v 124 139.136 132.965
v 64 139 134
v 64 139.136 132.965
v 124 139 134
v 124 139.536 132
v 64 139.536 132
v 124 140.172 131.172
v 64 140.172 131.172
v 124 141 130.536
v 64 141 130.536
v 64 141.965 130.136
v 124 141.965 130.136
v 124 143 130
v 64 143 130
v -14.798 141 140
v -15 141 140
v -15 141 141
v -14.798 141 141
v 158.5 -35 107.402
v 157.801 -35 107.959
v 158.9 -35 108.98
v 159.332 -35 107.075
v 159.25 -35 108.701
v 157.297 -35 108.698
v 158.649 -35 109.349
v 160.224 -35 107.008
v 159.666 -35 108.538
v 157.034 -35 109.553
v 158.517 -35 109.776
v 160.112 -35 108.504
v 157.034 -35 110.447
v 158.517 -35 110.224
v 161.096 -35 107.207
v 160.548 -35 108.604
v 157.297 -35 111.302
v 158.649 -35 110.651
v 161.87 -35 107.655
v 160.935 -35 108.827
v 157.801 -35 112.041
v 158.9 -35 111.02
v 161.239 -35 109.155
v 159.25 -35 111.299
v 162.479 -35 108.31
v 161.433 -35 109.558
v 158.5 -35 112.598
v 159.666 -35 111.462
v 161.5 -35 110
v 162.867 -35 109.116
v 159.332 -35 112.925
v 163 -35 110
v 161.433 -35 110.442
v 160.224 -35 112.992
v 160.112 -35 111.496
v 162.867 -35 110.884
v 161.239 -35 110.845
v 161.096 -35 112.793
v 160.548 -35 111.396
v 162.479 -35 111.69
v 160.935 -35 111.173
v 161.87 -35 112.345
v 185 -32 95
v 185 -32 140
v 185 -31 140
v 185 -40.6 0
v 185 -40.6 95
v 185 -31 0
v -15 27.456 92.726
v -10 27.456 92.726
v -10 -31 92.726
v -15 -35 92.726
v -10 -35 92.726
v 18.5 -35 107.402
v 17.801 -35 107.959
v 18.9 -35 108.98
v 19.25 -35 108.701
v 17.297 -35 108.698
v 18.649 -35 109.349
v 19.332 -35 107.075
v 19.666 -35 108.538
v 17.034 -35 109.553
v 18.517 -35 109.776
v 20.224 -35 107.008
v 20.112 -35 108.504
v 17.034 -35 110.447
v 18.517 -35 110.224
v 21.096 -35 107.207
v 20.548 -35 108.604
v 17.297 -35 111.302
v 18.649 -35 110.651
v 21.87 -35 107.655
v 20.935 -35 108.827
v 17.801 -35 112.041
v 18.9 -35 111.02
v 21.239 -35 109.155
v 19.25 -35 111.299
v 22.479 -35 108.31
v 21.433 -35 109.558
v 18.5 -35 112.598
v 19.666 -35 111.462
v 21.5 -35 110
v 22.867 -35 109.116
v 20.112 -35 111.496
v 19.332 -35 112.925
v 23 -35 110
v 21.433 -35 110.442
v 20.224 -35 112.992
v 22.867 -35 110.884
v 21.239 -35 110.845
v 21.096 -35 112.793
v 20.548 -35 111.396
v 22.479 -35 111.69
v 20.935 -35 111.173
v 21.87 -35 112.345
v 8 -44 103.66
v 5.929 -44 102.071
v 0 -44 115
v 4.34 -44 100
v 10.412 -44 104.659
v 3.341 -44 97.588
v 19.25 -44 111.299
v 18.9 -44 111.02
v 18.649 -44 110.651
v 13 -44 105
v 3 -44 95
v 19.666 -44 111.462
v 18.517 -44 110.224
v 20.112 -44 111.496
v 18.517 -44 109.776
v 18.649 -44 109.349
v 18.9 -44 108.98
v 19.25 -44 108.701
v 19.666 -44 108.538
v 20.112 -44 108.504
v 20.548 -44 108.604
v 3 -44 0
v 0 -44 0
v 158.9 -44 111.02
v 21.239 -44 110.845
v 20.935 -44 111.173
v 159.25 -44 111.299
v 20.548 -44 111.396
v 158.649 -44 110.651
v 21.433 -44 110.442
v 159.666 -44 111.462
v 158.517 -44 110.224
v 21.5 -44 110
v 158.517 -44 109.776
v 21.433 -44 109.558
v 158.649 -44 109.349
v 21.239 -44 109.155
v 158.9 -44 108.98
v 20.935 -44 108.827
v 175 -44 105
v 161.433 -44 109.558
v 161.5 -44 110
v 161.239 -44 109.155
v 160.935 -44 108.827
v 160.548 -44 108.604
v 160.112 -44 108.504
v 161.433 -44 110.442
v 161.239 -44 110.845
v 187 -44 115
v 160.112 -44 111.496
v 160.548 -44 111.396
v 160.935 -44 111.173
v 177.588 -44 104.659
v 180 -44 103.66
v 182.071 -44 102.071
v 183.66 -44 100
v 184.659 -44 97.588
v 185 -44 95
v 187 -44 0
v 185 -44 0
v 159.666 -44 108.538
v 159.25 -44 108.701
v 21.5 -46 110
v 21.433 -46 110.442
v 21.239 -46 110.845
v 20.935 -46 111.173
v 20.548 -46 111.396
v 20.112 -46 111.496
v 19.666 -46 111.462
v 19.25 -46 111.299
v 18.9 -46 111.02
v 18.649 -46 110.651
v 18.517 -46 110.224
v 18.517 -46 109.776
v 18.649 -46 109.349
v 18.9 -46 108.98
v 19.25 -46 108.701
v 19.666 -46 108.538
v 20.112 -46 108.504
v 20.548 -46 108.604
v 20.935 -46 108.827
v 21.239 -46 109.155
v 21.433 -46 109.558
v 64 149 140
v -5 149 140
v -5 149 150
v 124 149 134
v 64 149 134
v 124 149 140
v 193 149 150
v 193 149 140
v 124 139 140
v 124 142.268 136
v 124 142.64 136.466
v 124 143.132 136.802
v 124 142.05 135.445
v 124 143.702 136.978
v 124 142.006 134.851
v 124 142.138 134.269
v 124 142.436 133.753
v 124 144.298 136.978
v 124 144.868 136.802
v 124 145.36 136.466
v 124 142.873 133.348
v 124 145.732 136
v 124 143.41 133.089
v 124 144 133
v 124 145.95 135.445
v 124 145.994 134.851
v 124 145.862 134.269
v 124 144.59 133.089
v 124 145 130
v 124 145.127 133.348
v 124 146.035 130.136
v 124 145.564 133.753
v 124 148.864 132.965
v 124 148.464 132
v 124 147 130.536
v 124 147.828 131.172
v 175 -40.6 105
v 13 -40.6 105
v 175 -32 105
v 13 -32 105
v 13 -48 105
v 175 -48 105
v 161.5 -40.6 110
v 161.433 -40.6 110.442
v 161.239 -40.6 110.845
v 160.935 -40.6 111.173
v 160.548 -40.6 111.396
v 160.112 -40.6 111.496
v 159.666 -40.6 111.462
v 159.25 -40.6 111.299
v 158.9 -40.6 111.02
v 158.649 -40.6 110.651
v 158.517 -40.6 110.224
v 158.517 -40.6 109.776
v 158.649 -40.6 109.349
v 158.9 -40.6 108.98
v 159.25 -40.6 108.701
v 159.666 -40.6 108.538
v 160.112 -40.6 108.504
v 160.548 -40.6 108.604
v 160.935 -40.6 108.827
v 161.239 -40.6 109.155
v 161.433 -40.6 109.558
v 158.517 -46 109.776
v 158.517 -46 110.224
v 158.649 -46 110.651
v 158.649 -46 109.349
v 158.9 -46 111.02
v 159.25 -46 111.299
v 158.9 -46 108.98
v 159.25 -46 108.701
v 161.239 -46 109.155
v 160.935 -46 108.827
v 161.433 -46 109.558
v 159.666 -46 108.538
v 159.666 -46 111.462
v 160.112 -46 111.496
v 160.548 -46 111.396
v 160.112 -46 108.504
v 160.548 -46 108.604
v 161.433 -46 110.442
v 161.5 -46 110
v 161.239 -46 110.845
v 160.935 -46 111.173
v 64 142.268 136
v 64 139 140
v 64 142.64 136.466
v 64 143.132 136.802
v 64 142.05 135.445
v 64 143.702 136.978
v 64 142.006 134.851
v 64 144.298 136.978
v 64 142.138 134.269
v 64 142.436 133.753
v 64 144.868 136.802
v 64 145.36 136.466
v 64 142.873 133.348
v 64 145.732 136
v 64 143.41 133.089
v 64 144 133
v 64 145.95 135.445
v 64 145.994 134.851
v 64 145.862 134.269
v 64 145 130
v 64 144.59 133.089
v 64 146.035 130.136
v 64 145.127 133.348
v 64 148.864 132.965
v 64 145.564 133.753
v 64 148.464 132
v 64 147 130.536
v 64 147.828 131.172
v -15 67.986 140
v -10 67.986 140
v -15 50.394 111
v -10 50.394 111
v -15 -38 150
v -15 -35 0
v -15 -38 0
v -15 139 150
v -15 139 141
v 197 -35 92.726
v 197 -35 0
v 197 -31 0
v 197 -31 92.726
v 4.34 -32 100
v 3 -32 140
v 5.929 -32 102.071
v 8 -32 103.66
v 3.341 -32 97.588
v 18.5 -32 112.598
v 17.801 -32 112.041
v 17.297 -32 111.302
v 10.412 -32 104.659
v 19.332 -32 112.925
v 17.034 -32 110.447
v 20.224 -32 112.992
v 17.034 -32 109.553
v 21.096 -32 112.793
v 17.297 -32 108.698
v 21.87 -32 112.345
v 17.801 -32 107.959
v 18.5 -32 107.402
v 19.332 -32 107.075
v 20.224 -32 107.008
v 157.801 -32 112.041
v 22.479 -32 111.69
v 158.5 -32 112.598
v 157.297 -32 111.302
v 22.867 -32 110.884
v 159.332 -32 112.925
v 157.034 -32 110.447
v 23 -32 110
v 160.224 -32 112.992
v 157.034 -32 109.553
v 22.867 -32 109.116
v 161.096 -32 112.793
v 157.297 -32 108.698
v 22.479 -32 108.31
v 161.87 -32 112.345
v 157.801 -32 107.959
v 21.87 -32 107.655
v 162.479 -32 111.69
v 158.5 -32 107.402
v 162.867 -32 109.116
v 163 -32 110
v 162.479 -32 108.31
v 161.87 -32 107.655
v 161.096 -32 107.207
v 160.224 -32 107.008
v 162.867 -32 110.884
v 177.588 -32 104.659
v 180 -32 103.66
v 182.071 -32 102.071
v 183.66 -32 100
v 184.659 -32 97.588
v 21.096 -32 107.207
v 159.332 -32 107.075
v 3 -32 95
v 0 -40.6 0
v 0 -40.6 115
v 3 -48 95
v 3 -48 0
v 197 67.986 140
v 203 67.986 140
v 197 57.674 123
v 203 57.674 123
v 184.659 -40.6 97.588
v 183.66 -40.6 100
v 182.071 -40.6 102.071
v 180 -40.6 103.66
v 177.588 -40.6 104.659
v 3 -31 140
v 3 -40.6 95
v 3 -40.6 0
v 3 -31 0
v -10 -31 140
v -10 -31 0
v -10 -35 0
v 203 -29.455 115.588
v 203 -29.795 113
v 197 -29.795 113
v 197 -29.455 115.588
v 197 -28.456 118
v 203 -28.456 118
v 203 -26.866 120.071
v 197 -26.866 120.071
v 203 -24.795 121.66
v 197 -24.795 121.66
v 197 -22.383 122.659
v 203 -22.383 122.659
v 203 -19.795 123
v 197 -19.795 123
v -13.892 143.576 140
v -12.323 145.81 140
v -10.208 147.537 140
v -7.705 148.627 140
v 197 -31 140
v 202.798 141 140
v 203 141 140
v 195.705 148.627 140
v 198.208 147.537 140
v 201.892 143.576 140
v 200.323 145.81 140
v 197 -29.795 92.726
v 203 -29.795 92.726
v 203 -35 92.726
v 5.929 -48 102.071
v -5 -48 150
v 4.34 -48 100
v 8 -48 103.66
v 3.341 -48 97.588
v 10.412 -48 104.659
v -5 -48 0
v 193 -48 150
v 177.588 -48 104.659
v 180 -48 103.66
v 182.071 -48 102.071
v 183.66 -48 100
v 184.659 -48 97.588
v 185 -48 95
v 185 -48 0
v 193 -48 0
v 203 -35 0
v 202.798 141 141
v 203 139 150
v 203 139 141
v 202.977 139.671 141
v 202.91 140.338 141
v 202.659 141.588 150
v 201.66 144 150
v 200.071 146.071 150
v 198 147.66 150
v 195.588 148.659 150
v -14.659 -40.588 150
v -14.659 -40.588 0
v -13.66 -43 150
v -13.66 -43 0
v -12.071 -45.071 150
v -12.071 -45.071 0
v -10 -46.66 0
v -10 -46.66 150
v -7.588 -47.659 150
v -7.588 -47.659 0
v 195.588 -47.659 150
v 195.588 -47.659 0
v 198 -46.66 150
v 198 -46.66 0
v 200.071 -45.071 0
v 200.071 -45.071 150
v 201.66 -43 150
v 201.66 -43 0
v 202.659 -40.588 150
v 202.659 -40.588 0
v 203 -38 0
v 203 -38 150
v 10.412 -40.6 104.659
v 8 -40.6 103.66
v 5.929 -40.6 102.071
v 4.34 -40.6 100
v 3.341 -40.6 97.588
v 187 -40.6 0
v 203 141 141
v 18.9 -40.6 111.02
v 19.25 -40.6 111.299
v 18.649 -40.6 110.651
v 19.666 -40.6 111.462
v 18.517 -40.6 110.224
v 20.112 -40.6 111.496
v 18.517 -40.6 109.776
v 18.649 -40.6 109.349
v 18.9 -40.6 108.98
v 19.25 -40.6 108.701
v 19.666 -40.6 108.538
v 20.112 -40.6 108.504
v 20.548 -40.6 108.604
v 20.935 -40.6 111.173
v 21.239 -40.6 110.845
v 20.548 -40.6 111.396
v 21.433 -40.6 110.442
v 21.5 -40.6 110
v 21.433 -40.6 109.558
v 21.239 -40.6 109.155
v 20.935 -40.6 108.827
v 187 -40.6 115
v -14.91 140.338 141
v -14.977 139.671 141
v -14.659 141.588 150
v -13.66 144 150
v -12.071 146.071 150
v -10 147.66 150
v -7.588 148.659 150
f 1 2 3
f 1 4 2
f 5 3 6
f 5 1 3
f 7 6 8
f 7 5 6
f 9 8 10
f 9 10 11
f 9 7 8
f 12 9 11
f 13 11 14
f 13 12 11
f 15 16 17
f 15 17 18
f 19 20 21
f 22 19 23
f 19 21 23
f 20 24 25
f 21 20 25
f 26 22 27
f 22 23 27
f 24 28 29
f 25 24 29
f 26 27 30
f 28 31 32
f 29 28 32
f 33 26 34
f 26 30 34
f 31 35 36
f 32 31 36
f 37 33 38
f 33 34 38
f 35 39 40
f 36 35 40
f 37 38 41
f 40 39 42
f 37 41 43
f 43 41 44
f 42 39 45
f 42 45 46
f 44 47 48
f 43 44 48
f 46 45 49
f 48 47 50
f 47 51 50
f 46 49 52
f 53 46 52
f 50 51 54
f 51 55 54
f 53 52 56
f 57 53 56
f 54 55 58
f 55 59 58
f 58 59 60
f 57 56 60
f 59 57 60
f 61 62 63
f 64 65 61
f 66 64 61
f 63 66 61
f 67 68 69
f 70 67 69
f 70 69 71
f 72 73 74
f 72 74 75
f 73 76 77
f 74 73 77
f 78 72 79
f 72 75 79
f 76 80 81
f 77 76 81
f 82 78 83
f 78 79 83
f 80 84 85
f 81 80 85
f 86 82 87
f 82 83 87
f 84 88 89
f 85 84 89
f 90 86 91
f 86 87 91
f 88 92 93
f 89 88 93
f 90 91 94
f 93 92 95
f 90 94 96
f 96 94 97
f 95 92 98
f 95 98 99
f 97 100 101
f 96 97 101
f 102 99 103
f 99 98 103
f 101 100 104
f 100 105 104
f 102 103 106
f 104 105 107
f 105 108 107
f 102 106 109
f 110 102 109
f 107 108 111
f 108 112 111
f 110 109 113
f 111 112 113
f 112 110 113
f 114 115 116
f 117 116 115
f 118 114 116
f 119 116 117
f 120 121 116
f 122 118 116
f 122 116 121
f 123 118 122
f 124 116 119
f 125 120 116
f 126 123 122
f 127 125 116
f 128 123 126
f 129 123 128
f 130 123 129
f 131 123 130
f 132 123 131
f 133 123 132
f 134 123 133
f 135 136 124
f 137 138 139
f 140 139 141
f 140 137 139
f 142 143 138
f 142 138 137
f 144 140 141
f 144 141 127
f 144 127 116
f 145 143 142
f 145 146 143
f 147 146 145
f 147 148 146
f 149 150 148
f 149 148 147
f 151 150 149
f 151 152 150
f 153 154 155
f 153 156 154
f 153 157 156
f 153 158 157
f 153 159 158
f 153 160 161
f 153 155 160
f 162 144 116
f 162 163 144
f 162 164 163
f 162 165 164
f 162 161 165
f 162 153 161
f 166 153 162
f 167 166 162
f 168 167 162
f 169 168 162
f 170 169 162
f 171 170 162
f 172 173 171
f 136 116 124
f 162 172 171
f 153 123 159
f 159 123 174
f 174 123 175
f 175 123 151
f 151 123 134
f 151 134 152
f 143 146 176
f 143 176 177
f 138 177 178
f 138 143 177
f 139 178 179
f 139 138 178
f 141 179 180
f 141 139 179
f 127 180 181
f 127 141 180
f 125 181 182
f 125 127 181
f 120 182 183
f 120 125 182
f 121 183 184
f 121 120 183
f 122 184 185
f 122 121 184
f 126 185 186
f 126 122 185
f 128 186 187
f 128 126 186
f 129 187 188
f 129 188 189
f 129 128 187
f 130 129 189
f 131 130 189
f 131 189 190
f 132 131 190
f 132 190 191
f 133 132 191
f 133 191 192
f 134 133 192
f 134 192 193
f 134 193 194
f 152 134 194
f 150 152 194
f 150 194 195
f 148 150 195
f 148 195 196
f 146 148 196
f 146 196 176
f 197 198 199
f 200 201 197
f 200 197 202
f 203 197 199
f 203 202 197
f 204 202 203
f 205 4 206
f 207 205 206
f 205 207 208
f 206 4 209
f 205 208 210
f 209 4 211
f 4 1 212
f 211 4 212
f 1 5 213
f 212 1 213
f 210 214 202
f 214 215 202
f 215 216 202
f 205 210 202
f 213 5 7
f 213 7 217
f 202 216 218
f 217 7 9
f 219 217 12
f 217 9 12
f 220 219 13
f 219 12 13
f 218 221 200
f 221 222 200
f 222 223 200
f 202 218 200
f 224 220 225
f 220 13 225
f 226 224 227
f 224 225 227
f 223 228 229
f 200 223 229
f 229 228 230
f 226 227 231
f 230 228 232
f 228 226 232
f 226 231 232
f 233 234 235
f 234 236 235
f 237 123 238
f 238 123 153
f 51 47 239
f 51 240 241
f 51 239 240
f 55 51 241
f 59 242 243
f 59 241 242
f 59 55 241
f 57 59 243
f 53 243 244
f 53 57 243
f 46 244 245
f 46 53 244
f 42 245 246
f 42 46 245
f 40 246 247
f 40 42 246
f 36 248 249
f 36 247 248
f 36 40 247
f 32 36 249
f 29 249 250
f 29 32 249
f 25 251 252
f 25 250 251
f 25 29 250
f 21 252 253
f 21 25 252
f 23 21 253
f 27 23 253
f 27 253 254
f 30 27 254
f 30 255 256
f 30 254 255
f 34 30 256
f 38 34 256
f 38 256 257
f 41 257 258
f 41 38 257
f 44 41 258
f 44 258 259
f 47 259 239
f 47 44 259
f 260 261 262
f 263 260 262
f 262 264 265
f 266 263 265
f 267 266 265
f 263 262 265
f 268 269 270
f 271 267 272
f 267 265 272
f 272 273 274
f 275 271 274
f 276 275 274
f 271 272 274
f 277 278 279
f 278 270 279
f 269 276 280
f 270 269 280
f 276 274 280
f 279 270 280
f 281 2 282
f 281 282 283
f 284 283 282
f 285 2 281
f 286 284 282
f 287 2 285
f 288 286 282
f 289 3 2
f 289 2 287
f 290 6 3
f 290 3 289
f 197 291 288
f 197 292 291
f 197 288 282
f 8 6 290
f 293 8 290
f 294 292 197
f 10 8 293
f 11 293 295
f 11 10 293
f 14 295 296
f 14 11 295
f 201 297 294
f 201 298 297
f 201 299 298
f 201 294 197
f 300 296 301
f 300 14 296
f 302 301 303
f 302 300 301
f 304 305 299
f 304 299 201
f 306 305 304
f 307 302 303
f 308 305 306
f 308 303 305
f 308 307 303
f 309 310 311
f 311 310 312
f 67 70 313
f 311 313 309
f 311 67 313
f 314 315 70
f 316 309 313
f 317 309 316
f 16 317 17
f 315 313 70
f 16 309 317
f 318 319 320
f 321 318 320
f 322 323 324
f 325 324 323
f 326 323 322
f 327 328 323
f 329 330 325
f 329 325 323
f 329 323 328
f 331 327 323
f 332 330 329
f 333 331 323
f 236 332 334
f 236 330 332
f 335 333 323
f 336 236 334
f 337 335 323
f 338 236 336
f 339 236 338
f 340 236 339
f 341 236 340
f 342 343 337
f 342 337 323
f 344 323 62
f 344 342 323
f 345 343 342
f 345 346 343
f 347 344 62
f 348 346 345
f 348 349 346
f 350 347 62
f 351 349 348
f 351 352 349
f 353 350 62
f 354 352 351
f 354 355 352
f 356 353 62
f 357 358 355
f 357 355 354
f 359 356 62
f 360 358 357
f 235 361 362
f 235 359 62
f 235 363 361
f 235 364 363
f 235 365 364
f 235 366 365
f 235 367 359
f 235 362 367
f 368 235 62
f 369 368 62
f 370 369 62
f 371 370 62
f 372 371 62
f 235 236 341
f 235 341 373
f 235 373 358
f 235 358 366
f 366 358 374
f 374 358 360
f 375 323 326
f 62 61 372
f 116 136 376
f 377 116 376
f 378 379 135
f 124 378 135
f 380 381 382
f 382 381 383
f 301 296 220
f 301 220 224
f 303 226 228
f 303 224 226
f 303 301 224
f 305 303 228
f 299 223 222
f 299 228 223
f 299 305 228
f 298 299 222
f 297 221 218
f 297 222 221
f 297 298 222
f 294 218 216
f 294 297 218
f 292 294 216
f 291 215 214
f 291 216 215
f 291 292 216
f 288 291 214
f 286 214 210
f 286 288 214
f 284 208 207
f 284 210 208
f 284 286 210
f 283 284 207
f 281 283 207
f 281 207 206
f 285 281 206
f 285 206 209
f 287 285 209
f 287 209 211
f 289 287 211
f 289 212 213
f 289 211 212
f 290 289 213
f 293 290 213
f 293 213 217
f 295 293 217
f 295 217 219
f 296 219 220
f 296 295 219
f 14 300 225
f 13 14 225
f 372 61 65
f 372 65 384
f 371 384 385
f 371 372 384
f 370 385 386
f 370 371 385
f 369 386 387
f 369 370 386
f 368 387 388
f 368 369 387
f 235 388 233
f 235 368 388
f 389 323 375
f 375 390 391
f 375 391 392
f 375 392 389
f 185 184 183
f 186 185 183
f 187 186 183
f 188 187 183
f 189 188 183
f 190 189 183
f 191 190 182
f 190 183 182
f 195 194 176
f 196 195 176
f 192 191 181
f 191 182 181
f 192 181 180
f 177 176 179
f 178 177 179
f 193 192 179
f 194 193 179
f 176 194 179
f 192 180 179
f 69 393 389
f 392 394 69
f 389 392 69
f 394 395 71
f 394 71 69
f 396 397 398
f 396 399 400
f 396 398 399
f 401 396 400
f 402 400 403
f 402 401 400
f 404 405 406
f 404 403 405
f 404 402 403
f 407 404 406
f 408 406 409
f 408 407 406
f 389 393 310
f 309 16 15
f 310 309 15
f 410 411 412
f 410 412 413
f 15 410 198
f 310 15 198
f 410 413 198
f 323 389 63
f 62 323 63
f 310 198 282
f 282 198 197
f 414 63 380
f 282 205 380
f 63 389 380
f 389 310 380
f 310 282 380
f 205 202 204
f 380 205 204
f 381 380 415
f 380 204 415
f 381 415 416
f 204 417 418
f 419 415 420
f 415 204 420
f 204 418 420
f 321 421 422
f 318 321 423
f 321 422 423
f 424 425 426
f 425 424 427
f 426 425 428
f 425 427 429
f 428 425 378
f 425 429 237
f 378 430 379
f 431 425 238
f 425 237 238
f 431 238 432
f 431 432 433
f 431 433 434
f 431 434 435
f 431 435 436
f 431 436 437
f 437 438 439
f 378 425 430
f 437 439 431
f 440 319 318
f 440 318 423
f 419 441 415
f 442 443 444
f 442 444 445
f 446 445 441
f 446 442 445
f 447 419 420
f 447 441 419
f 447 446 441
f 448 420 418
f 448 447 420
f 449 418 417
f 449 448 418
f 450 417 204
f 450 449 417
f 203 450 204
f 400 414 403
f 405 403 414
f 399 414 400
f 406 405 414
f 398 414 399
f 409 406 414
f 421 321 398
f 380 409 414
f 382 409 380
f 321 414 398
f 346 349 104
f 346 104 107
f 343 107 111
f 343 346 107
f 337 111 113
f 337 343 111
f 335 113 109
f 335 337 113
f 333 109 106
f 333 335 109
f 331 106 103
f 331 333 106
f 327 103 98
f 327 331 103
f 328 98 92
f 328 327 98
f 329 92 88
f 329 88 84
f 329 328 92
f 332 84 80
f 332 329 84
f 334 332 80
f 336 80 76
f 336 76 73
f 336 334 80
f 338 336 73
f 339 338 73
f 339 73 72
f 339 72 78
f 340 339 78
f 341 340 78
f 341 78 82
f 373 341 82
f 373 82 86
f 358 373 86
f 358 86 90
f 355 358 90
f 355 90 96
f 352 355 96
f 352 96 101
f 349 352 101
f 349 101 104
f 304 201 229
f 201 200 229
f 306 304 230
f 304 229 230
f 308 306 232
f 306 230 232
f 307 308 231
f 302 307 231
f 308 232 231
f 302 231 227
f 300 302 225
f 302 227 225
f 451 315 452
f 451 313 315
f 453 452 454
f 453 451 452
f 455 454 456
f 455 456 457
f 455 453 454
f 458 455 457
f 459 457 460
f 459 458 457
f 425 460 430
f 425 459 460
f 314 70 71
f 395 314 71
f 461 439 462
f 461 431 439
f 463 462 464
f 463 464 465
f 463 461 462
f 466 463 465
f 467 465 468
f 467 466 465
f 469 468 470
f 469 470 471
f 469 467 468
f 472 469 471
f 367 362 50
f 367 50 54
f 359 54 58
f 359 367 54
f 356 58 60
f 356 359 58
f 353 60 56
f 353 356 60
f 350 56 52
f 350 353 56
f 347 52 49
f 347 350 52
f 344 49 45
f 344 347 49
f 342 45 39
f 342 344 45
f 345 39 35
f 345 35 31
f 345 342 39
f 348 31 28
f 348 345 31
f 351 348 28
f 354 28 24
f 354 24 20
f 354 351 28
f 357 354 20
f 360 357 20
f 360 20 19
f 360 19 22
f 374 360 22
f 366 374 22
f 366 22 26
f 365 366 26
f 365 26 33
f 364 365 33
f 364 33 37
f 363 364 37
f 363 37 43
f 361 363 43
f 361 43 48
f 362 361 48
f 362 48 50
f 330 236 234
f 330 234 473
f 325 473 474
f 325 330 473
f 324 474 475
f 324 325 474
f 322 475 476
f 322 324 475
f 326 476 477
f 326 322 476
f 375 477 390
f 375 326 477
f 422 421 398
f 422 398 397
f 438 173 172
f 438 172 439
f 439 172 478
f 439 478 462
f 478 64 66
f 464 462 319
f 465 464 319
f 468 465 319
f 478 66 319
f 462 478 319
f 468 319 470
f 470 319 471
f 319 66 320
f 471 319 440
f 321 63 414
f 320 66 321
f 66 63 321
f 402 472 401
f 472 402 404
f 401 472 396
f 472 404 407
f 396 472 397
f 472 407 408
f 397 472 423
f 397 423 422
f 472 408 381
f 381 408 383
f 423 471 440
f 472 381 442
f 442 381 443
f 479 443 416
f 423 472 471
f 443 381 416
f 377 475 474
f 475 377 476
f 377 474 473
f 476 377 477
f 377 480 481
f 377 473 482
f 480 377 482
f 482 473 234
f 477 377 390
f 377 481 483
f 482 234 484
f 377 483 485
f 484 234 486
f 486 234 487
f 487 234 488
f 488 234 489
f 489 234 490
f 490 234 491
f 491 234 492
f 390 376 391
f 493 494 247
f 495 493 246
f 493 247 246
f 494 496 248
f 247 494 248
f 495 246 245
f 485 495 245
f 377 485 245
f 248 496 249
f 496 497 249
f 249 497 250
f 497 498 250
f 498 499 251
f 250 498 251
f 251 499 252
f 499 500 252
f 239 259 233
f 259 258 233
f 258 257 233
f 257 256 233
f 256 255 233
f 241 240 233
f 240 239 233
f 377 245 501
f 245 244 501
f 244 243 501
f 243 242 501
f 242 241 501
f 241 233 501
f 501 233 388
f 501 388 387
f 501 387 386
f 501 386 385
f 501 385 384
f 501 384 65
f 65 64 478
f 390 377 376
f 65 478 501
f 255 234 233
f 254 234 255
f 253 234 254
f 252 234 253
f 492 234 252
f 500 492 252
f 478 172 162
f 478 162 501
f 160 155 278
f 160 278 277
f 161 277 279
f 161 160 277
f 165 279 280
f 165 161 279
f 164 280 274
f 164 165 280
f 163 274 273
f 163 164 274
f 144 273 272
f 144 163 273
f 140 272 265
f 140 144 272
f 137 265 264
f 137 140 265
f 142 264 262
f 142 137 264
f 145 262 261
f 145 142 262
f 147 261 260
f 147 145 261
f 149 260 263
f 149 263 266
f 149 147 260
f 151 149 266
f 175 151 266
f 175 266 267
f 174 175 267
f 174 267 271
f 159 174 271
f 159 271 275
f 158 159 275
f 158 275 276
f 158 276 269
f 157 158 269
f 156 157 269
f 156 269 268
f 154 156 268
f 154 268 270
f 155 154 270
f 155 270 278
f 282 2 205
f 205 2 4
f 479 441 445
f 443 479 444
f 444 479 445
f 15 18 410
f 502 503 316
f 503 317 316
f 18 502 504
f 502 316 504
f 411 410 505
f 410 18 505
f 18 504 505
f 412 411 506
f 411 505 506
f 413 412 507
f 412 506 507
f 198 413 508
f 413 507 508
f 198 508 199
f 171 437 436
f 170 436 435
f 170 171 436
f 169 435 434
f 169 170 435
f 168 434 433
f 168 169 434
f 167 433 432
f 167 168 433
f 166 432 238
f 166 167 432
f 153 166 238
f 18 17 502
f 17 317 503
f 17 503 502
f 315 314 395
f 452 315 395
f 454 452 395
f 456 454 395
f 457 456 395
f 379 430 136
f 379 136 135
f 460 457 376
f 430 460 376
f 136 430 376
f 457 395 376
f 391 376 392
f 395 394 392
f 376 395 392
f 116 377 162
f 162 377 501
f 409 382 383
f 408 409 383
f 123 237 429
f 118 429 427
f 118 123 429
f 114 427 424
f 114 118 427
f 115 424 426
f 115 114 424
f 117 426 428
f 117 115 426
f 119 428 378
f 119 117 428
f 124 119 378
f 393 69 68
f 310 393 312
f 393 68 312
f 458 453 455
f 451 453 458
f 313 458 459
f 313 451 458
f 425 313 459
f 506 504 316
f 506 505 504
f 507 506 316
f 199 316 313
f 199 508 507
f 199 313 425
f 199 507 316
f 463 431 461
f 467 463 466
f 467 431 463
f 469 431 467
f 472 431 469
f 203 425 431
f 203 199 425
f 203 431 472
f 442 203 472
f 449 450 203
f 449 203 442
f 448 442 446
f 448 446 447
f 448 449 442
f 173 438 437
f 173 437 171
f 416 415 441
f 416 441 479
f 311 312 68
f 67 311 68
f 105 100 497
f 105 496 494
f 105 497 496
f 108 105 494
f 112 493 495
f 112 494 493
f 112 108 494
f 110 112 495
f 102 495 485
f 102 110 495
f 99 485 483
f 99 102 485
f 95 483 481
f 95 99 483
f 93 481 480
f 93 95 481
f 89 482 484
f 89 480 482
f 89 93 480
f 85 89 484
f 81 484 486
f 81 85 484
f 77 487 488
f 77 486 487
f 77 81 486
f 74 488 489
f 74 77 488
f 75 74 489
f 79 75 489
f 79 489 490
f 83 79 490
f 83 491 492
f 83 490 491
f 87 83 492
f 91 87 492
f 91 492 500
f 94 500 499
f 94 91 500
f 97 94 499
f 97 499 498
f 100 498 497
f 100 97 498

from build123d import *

# Parameters (mm, degrees)
BOX100_W                  = 187
BOX100_H                  = 3.4
BOX100_DEPTH              = 115
CYLINDER175_R             = 3
CYLINDER175_DEPTH         = 200
CYLINDER175_ROLL_ANGLE    = 90
CYLINDER176_R             = 3
CYLINDER176_DEPTH         = 200
CYLINDER176_ROLL_ANGLE    = 90
CYLINDER178_R             = 1.5
CYLINDER178_DEPTH         = 200
CYLINDER178_ROLL_ANGLE    = 90
CYLINDER177_R             = 1.5
CYLINDER177_DEPTH         = 200
CYLINDER177_ROLL_ANGLE    = 90
PAD090_DEPTH              = 55
BOX094_W                  = 5
BOX094_H                  = 176
BOX094_DEPTH              = 140
PAD091_DEPTH              = 55
BOX095_W                  = 6
BOX095_H                  = 176
BOX095_DEPTH              = 140
BOX093_W                  = 33
BOX093_H                  = 132
BOX093_DEPTH              = 54
BOX093_PLACEMENT_ANGLE    = 3
FILLET087_R               = 10
FILLET087_PLACEMENT_ANGLE = -3
BOX091_W                  = 18
BOX091_H                  = 17
BOX091_DEPTH              = 140
FILLET086_R               = 10
BOX090_W                  = 18
BOX090_H                  = 17
BOX090_DEPTH              = 140
FILLET085_R               = 10
BOX092_W                  = 182
BOX092_H                  = 16
BOX092_DEPTH              = 35
BOX097_W                  = 6
BOX097_H                  = 176
BOX097_DEPTH              = 80
BOX096_W                  = 5
BOX096_H                  = 176
BOX096_DEPTH              = 80
BOX088_W                  = 218
BOX088_H                  = 197
BOX088_DEPTH              = 10
FILLET083_R               = 10
FILLET084_R               = 10
CYLINDER172_R             = 2
CYLINDER172_DEPTH         = 300
CYLINDER172_PITCH_ANGLE   = 90
BOX099_W                  = 60
BOX099_H                  = 10
BOX099_DEPTH              = 10
FILLET089_R               = 4
FILLET090_R               = 10
FILLET091_R               = 10


with BuildPart() as cubo095:
    # Box100 → Box100 (new body)
    with BuildSketch(Plane(origin=(0, -44, 0), x_dir=(1, 0, 0), z_dir=(0, 0, 1))):
        with Locations((93.5, 1.7)):
            Rectangle(BOX100_W, BOX100_H)
    extrude(amount=BOX100_DEPTH)


with BuildPart() as varilla8y019:
    # Cylinder175 → Cylinder175 (new body)
    with BuildSketch(Plane.XY):
        Circle(CYLINDER175_R)
    extrude(amount=CYLINDER175_DEPTH)


with BuildPart() as varilla8y019_1:
    # Cylinder175 roll: moved
    add(varilla8y019.part.rotate(Axis((0, 0, 0), (1, 0, 0)), CYLINDER175_ROLL_ANGLE))


with BuildPart() as varilla8y019_2:
    # Cylinder175 placement: moved
    add(varilla8y019_1.part.moved(Location((20, 165, 110))))


with BuildPart() as varilla8y020:
    # Cylinder176 → Cylinder176 (new body)
    with BuildSketch(Plane.XY):
        Circle(CYLINDER176_R)
    extrude(amount=CYLINDER176_DEPTH)


with BuildPart() as varilla8y020_1:
    # Cylinder176 roll: moved
    add(varilla8y020.part.rotate(Axis((0, 0, 0), (1, 0, 0)), CYLINDER176_ROLL_ANGLE))


with BuildPart() as varilla8y020_2:
    # Cylinder176 placement: moved
    add(varilla8y020_1.part.moved(Location((160, 165, 110))))


with BuildPart() as varilla8y022:
    # Cylinder178 → Cylinder178 (new body)
    with BuildSketch(Plane.XY):
        Circle(CYLINDER178_R)
    extrude(amount=CYLINDER178_DEPTH)


with BuildPart() as varilla8y022_1:
    # Cylinder178 roll: moved
    add(varilla8y022.part.rotate(Axis((0, 0, 0), (1, 0, 0)), CYLINDER178_ROLL_ANGLE))


with BuildPart() as varilla8y022_2:
    # Cylinder178 placement: moved
    add(varilla8y022_1.part.moved(Location((160, 154, 110))))


with BuildPart() as varilla8y021:
    # Cylinder177 → Cylinder177 (new body)
    with BuildSketch(Plane.XY):
        Circle(CYLINDER177_R)
    extrude(amount=CYLINDER177_DEPTH)


with BuildPart() as varilla8y021_1:
    # Cylinder177 roll: moved
    add(varilla8y021.part.rotate(Axis((0, 0, 0), (1, 0, 0)), CYLINDER177_ROLL_ANGLE))


with BuildPart() as varilla8y021_2:
    # Cylinder177 placement: moved
    add(varilla8y021_1.part.moved(Location((20, 154, 110))))


with BuildPart() as pad090:
    # Sketch098 → Pad090 (new body)
    with BuildSketch(Plane(origin=(0, 0, 0), x_dir=(0, -1, 0), z_dir=(-1, 0, 0))):
        Polygon((-174.561249, 149.464645), (-73.728157, 149.464645), (-50.393822, 111), (-27.455967, 92.725647), (51.678024, 92.725647), (59.260941, 172), (-154.48703, 174.345367), align=None)
    extrude(amount=PAD090_DEPTH)


with BuildPart() as cut209:
    # Box094 → Box094 (new body)
    with BuildSketch(Plane(origin=(-15, -35, 0), x_dir=(1, 0, 0), z_dir=(0, 0, 1))):
        with Locations((2.5, 88)):
            Rectangle(BOX094_W, BOX094_H)
    extrude(amount=BOX094_DEPTH)

    # Cut209: cut Pad090
    add(pad090.part, mode=Mode.SUBTRACT)


with BuildPart() as pad091:
    # Sketch099 → Pad091 (new body)
    with BuildSketch(Plane(origin=(0, 0, 0), x_dir=(0, -1, 0), z_dir=(-1, 0, 0))):
        Polygon((-174.561249, 149.464645), (-73.728157, 149.464645), (-50.393822, 111), (-27.455967, 92.725647), (51.678024, 92.725647), (59.260941, 172), (-154.48703, 174.345367), align=None)
    extrude(amount=PAD091_DEPTH)


with BuildPart() as cut210:
    # Box095 → Box095 (new body)
    with BuildSketch(Plane(origin=(-15, -35, 0), x_dir=(1, 0, 0), z_dir=(0, 0, 1))):
        with Locations((3, 88)):
            Rectangle(BOX095_W, BOX095_H)
    extrude(amount=BOX095_DEPTH)

    # Cut210: cut Pad091
    add(pad091.part, mode=Mode.SUBTRACT)


with BuildPart() as cut210_1:
    # Cut210 placement: moved
    add(cut210.part.moved(Location((212, 0, 0))))


with BuildPart() as fillet104:
    # Box093 → Box093 (new body)
    with BuildSketch(Plane.XY):
        with Locations((16.5, 66)):
            Rectangle(BOX093_W, BOX093_H)
    extrude(amount=BOX093_DEPTH)


with BuildPart() as fillet104_1:
    # Box093 placement: moved
    add(fillet104.part.moved(Location((188, -32, 69))).rotate(Axis((188, -32, 69), (0, 0, 1)), BOX093_PLACEMENT_ANGLE))

    # Fillet087
    fillet087_edges = [fillet104_1.edges().sort_by_distance(p)[0] for p in [
        (204.477387, -31.136457, 69),
        (204.477387, -31.136457, 123),
        (197.569041, 100.682642, 69),
        (197.569041, 100.682642, 123),
    ]]
    fillet(fillet087_edges, radius=FILLET087_R)


with BuildPart() as fillet104_2:
    # Fillet087 placement: moved
    add(fillet104_1.part.moved(Location((0, 12, 0))).rotate(Axis((0, 12, 0), (0, 0, 1)), FILLET087_PLACEMENT_ANGLE))


with BuildPart() as fillet103:
    # Box091 → Box091 (new body)
    with BuildSketch(Plane(origin=(185, -48, 0), x_dir=(1, 0, 0), z_dir=(0, 0, 1))):
        with Locations((9, 8.5)):
            Rectangle(BOX091_W, BOX091_H)
    extrude(amount=BOX091_DEPTH)

    # Fillet086
    fillet086_edges = [fillet103.edges().sort_by_distance(p)[0] for p in [
        (203, -48, 70),
    ]]
    fillet(fillet086_edges, radius=FILLET086_R)


with BuildPart() as fillet102:
    # Box090 → Box090 (new body)
    with BuildSketch(Plane(origin=(-15, -48, 0), x_dir=(1, 0, 0), z_dir=(0, 0, 1))):
        with Locations((9, 8.5)):
            Rectangle(BOX090_W, BOX090_H)
    extrude(amount=BOX090_DEPTH)

    # Fillet085
    fillet085_edges = [fillet102.edges().sort_by_distance(p)[0] for p in [
        (-15, -48, 70),
    ]]
    fillet(fillet085_edges, radius=FILLET085_R)


with BuildPart() as cubo087:
    # Box092 → Box092 (new body)
    with BuildSketch(Plane(origin=(3, -48, 105), x_dir=(1, 0, 0), z_dir=(0, 0, 1))):
        with Locations((91, 8)):
            Rectangle(BOX092_W, BOX092_H)
    extrude(amount=BOX092_DEPTH)


with BuildPart() as cubo092:
    # Box097 → Box097 (new body)
    with BuildSketch(Plane(origin=(197, -35, 61), x_dir=(1, 0, 0), z_dir=(0, 0, 1))):
        with Locations((3, 88)):
            Rectangle(BOX097_W, BOX097_H)
    extrude(amount=BOX097_DEPTH)


with BuildPart() as cubo091:
    # Box096 → Box096 (new body)
    with BuildSketch(Plane(origin=(-15, -35, 61), x_dir=(1, 0, 0), z_dir=(0, 0, 1))):
        with Locations((2.5, 88)):
            Rectangle(BOX096_W, BOX096_H)
    extrude(amount=BOX096_DEPTH)


with BuildPart() as cut213:
    # Box088 → Box088 (new body)
    with BuildSketch(Plane(origin=(-15, -48, 140), x_dir=(1, 0, 0), z_dir=(0, 0, 1))):
        with Locations((109, 98.5)):
            Rectangle(BOX088_W, BOX088_H)
    extrude(amount=BOX088_DEPTH)

    # Fillet083
    fillet083_edges = [cut213.edges().sort_by_distance(p)[0] for p in [
        (-15, 149, 145),
        (203, 149, 145),
    ]]
    fillet(fillet083_edges, radius=FILLET083_R)

    # Fillet084
    fillet084_edges = [cut213.edges().sort_by_distance(p)[0] for p in [
        (-15, -48, 145),
        (203, -48, 145),
    ]]
    fillet(fillet084_edges, radius=FILLET084_R)

    # Fusion092: union Cubo092, Cubo091
    add(cubo092.part)
    add(cubo091.part)

    # Fusion093: union Fillet103, Fillet102, Cubo087
    add(fillet103.part)
    add(fillet102.part)
    add(cubo087.part)

    # Cut211: cut Fillet104
    add(fillet104_2.part, mode=Mode.SUBTRACT)

    # Cut212: cut Cut210
    add(cut210_1.part, mode=Mode.SUBTRACT)

    # Cut213: cut Cut209
    add(cut209.part, mode=Mode.SUBTRACT)


with BuildPart() as varilla8x012:
    # Cylinder172 → Cylinder172 (new body)
    with BuildSketch(Plane.XY):
        Circle(CYLINDER172_R)
    extrude(amount=CYLINDER172_DEPTH)


with BuildPart() as varilla8x012_1:
    # Cylinder172 pitch: moved
    add(varilla8x012.part.rotate(Axis((0, 0, 0), (0, 1, 0)), CYLINDER172_PITCH_ANGLE))


with BuildPart() as varilla8x012_2:
    # Cylinder172 placement: moved
    add(varilla8x012_1.part.moved(Location((-54, 144, 135))))


with BuildPart() as top:
    # Box099 → Box099 (new body)
    with BuildSketch(Plane(origin=(64, 139, 130), x_dir=(1, 0, 0), z_dir=(0, 0, 1))):
        with Locations((30, 5)):
            Rectangle(BOX099_W, BOX099_H)
    extrude(amount=BOX099_DEPTH)

    # Fillet089
    fillet089_edges = [top.edges().sort_by_distance(p)[0] for p in [
        (94, 139, 130),
        (94, 149, 130),
    ]]
    fillet(fillet089_edges, radius=FILLET089_R)

    # Cut216: cut varilla8x012
    add(varilla8x012_2.part, mode=Mode.SUBTRACT)

    # Fusion094: union Cut213
    add(cut213.part)

    # Fillet090
    fillet090_edges = [top.edges().sort_by_distance(p)[0] for p in [
        (3, -40, 105),
    ]]
    fillet(fillet090_edges, radius=FILLET090_R)

    # Fillet091
    fillet091_edges = [top.edges().sort_by_distance(p)[0] for p in [
        (185, -40, 105),
    ]]
    fillet(fillet091_edges, radius=FILLET091_R)

    # Cut219: cut varilla8y021
    add(varilla8y021_2.part, mode=Mode.SUBTRACT)

    # Cut220: cut varilla8y022
    add(varilla8y022_2.part, mode=Mode.SUBTRACT)

    # Cut221: cut varilla8y020
    add(varilla8y020_2.part, mode=Mode.SUBTRACT)

    # Cut222: cut varilla8y019
    add(varilla8y019_2.part, mode=Mode.SUBTRACT)

    # Cut223: cut Cubo095
    add(cubo095.part, mode=Mode.SUBTRACT)


solid = top.part
